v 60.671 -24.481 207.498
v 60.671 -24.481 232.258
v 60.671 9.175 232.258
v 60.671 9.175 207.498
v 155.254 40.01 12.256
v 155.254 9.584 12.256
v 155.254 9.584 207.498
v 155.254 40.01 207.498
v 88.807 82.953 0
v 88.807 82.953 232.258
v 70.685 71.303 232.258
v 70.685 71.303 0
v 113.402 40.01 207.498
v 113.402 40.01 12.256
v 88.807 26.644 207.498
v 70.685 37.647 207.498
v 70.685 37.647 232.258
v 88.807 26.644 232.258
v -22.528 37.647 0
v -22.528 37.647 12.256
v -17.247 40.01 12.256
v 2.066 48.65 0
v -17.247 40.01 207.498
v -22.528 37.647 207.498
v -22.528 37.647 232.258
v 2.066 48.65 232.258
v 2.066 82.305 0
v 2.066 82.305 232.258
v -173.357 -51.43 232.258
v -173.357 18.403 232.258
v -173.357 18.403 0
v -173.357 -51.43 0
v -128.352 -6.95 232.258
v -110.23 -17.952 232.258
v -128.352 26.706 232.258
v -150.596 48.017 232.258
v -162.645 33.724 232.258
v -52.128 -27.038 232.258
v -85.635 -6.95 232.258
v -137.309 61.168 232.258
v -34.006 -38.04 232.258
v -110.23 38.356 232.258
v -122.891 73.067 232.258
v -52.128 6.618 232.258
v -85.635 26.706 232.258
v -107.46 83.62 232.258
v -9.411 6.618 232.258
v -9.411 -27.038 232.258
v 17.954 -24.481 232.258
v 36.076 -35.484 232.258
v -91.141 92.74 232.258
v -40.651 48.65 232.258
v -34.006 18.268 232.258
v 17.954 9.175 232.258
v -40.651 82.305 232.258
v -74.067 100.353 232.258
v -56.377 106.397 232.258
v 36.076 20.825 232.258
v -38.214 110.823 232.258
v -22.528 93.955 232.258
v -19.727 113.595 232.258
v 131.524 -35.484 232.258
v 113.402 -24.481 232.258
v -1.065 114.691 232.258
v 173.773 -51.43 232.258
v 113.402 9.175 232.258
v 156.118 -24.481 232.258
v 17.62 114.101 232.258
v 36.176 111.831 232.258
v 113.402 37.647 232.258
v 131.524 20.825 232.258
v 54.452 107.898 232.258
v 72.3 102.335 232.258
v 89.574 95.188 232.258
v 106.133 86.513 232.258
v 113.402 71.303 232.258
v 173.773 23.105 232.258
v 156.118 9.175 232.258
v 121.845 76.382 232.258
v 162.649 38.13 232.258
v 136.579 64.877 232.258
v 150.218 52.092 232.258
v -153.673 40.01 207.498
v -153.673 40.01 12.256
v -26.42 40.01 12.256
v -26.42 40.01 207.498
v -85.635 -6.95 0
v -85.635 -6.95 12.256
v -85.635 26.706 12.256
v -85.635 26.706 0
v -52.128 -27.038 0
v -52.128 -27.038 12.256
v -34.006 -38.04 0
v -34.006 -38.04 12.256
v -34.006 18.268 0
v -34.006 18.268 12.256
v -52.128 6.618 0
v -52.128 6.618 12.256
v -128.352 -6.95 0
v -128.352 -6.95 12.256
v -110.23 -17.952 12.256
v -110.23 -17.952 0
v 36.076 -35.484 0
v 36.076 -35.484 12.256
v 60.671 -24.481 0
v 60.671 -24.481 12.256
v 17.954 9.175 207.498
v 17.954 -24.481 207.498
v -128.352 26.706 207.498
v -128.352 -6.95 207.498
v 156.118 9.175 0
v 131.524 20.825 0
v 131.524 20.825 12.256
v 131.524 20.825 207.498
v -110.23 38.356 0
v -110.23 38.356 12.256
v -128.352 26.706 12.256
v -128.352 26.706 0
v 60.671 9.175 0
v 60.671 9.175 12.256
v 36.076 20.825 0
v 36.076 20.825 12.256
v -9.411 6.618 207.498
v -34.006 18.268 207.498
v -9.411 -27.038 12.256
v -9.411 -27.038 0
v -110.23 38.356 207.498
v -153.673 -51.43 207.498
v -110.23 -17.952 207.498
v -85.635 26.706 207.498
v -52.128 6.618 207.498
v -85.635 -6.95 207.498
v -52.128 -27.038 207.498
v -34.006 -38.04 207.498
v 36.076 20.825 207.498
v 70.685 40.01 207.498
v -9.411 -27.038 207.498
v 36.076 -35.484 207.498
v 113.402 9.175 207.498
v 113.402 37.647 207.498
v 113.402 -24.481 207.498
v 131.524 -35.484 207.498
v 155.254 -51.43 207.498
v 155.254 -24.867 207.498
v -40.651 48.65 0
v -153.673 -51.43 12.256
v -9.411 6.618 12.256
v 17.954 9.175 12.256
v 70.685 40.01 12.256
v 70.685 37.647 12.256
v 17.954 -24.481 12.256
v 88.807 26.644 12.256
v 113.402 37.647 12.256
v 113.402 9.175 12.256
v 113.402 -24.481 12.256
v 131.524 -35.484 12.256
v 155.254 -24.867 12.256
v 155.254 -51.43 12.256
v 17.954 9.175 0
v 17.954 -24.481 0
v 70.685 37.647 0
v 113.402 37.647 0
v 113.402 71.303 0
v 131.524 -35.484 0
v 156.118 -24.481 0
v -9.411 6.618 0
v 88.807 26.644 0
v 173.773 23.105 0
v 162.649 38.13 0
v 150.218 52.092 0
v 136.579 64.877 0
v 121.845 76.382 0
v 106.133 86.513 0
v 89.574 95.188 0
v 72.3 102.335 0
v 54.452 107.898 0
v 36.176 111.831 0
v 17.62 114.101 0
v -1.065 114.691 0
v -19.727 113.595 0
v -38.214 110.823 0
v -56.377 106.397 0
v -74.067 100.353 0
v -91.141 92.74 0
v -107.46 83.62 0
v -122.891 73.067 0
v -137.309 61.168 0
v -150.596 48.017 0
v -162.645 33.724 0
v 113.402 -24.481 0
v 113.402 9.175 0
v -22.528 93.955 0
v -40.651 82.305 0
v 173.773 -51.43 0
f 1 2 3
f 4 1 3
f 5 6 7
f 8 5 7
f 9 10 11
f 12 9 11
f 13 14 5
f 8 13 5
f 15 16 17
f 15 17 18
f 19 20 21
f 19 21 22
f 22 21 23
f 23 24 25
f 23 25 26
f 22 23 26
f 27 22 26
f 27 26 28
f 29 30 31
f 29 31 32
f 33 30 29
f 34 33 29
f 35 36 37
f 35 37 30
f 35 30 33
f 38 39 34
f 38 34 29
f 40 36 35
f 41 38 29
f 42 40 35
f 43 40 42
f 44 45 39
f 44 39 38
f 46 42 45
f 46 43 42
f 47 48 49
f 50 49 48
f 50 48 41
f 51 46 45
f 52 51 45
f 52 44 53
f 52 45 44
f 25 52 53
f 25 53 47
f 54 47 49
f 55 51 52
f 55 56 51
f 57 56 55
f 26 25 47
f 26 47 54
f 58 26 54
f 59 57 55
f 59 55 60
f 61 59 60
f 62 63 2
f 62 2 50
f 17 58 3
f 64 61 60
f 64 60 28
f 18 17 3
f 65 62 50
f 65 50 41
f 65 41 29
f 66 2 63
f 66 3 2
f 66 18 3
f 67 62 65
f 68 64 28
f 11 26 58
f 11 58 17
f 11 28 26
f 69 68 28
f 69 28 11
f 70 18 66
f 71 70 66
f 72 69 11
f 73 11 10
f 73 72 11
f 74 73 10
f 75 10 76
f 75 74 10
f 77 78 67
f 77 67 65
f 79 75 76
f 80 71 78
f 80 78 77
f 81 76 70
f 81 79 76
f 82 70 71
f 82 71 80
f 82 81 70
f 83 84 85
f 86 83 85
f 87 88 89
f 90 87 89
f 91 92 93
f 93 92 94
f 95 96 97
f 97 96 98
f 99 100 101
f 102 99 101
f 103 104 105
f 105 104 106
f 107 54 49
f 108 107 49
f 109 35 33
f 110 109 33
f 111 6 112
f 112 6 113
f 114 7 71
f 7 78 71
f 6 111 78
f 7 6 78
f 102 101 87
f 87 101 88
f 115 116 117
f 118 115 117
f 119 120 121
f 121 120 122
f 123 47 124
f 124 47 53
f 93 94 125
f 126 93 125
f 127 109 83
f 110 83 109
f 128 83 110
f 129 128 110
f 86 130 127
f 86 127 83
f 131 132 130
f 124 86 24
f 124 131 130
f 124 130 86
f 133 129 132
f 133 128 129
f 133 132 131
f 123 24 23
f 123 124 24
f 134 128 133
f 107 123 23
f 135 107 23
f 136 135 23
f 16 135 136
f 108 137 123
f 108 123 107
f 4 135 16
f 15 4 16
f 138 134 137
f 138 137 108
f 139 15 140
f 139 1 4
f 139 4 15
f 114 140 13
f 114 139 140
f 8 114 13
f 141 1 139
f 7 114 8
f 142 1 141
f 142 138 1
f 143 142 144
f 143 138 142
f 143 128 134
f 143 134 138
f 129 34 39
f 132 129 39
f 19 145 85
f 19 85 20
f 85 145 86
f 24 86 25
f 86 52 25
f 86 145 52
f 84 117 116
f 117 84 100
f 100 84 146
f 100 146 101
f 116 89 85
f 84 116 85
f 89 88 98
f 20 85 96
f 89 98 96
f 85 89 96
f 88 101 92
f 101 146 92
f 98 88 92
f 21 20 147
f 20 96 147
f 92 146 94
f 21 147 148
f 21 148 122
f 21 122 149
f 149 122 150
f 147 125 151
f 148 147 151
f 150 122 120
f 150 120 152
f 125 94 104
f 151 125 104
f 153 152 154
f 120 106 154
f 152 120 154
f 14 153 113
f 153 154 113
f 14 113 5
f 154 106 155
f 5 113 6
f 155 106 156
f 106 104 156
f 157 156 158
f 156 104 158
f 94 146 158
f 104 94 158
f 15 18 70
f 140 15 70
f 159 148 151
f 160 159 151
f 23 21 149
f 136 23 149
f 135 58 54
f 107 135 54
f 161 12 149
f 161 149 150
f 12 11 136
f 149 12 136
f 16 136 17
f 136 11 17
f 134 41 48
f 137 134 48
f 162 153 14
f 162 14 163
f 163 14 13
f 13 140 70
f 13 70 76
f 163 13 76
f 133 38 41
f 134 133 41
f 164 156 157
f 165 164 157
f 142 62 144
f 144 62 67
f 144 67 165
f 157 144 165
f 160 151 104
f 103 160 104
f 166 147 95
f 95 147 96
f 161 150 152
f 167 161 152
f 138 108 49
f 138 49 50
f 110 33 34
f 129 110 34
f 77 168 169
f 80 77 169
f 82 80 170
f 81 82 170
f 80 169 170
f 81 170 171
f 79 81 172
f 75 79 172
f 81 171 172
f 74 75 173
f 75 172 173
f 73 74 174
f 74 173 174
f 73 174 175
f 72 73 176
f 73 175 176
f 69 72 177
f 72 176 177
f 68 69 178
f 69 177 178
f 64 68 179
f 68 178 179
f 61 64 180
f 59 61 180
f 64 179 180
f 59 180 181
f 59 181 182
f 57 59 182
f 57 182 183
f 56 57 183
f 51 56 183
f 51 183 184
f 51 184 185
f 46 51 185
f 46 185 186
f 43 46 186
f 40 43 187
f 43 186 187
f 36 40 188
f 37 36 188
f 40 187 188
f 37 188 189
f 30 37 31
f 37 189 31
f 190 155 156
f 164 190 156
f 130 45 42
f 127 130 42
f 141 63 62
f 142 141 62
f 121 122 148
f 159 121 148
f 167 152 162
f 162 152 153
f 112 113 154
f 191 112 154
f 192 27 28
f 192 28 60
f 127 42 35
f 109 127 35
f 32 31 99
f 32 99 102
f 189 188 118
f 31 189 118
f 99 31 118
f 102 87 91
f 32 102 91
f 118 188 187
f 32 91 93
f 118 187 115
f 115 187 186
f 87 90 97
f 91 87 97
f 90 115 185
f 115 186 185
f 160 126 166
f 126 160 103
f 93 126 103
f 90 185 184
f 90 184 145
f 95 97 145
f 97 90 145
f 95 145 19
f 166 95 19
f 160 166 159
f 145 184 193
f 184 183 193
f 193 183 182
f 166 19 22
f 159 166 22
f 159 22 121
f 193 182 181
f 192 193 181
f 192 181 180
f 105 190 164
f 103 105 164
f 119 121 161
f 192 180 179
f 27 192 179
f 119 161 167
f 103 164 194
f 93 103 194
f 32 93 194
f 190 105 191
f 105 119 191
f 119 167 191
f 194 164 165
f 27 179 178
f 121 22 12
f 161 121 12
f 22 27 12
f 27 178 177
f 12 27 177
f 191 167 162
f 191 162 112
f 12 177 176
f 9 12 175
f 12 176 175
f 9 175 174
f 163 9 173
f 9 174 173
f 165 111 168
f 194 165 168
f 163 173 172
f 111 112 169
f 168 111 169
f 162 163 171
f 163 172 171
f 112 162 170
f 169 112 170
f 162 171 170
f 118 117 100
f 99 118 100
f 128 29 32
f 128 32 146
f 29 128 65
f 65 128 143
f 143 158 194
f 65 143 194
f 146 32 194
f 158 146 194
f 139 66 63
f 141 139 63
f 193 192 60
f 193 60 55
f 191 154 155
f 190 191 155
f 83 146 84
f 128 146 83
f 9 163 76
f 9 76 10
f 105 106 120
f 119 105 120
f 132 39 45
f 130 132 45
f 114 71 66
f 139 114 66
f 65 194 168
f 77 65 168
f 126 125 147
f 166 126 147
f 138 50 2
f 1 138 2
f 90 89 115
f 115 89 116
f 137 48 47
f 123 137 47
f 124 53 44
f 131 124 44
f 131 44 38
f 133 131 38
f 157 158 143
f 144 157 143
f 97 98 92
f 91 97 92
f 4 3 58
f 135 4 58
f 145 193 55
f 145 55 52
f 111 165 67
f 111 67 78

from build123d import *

# Parameters (mm, degrees)
F1_DEPTH = 232.2576
F2_W     = 308.927283
F2_H     = 195.242041
F3_DEPTH = 91.44
F5_DEPTH = 508


with BuildPart() as f1:
    # F0 (on Top) → F1 (new body)
    with BuildSketch(Plane.XY):
        with BuildLine():
            ThreePointArc((-173.357227, 18.40329), (-1.055729, 114.038895), (173.772714, 23.104903))
            ThreePointArc((173.772714, 23.104903), (-1.064562, 114.691102), (-173.357227, 18.40329))
        make_face()
        with BuildLine():
            Line((173.772714, -51.430393), (173.772714, 23.104903))
            ThreePointArc((173.772714, 23.104903), (-1.055729, 114.038895), (-173.357227, 18.40329))
            Line((-173.357227, 18.40329), (-173.357227, -51.430393))
            Line((-173.357227, -51.430393), (173.772714, -51.430393))
        make_face()
    extrude(amount=F1_DEPTH)

    # F2 (on face) → F3 (cut)
    with BuildSketch(Plane.XZ.offset(51.430393)):
        with Locations((0.790856, 109.876665)):
            Rectangle(F2_W, F2_H)
    extrude(amount=-F3_DEPTH, mode=Mode.SUBTRACT)

    # F4 (on face) → F5 (cut)
    with BuildSketch(Plane.XY.offset(232.2576)):
        Polygon((-128.352299, 26.706169), (-128.352299, -6.949546), (-110.229991, -17.952379), (-85.635431, -6.949546), (-85.635431, 26.706169), (-110.229991, 38.356224), align=None)
        Polygon((-52.128345, 6.618178), (-52.128345, -27.037537), (-34.006037, -38.04037), (-9.411477, -27.037537), (-9.411477, 6.618178), (-34.006037, 18.268233), align=None)
        Polygon((17.95378, 9.17491), (17.95378, -24.480805), (36.076088, -35.483638), (60.670648, -24.480805), (60.670648, 9.17491), (36.076088, 20.824965), align=None)
        Polygon((113.401607, 9.17491), (113.401607, -24.480805), (131.523915, -35.483638), (156.118475, -24.480805), (156.118475, 9.17491), (131.523915, 20.824965), align=None)
        Polygon((70.684742, 71.302582), (70.684742, 37.646867), (88.80705, 26.644034), (113.40161, 37.646867), (113.40161, 71.302582), (88.80705, 82.952637), align=None)
        Polygon((-40.650681, 82.305415), (-40.650681, 48.6497), (-22.528373, 37.646867), (2.066188, 48.6497), (2.066188, 82.305415), (-22.528373, 93.95547), align=None)
    extrude(amount=-F5_DEPTH, mode=Mode.SUBTRACT)


solid = f1.part
